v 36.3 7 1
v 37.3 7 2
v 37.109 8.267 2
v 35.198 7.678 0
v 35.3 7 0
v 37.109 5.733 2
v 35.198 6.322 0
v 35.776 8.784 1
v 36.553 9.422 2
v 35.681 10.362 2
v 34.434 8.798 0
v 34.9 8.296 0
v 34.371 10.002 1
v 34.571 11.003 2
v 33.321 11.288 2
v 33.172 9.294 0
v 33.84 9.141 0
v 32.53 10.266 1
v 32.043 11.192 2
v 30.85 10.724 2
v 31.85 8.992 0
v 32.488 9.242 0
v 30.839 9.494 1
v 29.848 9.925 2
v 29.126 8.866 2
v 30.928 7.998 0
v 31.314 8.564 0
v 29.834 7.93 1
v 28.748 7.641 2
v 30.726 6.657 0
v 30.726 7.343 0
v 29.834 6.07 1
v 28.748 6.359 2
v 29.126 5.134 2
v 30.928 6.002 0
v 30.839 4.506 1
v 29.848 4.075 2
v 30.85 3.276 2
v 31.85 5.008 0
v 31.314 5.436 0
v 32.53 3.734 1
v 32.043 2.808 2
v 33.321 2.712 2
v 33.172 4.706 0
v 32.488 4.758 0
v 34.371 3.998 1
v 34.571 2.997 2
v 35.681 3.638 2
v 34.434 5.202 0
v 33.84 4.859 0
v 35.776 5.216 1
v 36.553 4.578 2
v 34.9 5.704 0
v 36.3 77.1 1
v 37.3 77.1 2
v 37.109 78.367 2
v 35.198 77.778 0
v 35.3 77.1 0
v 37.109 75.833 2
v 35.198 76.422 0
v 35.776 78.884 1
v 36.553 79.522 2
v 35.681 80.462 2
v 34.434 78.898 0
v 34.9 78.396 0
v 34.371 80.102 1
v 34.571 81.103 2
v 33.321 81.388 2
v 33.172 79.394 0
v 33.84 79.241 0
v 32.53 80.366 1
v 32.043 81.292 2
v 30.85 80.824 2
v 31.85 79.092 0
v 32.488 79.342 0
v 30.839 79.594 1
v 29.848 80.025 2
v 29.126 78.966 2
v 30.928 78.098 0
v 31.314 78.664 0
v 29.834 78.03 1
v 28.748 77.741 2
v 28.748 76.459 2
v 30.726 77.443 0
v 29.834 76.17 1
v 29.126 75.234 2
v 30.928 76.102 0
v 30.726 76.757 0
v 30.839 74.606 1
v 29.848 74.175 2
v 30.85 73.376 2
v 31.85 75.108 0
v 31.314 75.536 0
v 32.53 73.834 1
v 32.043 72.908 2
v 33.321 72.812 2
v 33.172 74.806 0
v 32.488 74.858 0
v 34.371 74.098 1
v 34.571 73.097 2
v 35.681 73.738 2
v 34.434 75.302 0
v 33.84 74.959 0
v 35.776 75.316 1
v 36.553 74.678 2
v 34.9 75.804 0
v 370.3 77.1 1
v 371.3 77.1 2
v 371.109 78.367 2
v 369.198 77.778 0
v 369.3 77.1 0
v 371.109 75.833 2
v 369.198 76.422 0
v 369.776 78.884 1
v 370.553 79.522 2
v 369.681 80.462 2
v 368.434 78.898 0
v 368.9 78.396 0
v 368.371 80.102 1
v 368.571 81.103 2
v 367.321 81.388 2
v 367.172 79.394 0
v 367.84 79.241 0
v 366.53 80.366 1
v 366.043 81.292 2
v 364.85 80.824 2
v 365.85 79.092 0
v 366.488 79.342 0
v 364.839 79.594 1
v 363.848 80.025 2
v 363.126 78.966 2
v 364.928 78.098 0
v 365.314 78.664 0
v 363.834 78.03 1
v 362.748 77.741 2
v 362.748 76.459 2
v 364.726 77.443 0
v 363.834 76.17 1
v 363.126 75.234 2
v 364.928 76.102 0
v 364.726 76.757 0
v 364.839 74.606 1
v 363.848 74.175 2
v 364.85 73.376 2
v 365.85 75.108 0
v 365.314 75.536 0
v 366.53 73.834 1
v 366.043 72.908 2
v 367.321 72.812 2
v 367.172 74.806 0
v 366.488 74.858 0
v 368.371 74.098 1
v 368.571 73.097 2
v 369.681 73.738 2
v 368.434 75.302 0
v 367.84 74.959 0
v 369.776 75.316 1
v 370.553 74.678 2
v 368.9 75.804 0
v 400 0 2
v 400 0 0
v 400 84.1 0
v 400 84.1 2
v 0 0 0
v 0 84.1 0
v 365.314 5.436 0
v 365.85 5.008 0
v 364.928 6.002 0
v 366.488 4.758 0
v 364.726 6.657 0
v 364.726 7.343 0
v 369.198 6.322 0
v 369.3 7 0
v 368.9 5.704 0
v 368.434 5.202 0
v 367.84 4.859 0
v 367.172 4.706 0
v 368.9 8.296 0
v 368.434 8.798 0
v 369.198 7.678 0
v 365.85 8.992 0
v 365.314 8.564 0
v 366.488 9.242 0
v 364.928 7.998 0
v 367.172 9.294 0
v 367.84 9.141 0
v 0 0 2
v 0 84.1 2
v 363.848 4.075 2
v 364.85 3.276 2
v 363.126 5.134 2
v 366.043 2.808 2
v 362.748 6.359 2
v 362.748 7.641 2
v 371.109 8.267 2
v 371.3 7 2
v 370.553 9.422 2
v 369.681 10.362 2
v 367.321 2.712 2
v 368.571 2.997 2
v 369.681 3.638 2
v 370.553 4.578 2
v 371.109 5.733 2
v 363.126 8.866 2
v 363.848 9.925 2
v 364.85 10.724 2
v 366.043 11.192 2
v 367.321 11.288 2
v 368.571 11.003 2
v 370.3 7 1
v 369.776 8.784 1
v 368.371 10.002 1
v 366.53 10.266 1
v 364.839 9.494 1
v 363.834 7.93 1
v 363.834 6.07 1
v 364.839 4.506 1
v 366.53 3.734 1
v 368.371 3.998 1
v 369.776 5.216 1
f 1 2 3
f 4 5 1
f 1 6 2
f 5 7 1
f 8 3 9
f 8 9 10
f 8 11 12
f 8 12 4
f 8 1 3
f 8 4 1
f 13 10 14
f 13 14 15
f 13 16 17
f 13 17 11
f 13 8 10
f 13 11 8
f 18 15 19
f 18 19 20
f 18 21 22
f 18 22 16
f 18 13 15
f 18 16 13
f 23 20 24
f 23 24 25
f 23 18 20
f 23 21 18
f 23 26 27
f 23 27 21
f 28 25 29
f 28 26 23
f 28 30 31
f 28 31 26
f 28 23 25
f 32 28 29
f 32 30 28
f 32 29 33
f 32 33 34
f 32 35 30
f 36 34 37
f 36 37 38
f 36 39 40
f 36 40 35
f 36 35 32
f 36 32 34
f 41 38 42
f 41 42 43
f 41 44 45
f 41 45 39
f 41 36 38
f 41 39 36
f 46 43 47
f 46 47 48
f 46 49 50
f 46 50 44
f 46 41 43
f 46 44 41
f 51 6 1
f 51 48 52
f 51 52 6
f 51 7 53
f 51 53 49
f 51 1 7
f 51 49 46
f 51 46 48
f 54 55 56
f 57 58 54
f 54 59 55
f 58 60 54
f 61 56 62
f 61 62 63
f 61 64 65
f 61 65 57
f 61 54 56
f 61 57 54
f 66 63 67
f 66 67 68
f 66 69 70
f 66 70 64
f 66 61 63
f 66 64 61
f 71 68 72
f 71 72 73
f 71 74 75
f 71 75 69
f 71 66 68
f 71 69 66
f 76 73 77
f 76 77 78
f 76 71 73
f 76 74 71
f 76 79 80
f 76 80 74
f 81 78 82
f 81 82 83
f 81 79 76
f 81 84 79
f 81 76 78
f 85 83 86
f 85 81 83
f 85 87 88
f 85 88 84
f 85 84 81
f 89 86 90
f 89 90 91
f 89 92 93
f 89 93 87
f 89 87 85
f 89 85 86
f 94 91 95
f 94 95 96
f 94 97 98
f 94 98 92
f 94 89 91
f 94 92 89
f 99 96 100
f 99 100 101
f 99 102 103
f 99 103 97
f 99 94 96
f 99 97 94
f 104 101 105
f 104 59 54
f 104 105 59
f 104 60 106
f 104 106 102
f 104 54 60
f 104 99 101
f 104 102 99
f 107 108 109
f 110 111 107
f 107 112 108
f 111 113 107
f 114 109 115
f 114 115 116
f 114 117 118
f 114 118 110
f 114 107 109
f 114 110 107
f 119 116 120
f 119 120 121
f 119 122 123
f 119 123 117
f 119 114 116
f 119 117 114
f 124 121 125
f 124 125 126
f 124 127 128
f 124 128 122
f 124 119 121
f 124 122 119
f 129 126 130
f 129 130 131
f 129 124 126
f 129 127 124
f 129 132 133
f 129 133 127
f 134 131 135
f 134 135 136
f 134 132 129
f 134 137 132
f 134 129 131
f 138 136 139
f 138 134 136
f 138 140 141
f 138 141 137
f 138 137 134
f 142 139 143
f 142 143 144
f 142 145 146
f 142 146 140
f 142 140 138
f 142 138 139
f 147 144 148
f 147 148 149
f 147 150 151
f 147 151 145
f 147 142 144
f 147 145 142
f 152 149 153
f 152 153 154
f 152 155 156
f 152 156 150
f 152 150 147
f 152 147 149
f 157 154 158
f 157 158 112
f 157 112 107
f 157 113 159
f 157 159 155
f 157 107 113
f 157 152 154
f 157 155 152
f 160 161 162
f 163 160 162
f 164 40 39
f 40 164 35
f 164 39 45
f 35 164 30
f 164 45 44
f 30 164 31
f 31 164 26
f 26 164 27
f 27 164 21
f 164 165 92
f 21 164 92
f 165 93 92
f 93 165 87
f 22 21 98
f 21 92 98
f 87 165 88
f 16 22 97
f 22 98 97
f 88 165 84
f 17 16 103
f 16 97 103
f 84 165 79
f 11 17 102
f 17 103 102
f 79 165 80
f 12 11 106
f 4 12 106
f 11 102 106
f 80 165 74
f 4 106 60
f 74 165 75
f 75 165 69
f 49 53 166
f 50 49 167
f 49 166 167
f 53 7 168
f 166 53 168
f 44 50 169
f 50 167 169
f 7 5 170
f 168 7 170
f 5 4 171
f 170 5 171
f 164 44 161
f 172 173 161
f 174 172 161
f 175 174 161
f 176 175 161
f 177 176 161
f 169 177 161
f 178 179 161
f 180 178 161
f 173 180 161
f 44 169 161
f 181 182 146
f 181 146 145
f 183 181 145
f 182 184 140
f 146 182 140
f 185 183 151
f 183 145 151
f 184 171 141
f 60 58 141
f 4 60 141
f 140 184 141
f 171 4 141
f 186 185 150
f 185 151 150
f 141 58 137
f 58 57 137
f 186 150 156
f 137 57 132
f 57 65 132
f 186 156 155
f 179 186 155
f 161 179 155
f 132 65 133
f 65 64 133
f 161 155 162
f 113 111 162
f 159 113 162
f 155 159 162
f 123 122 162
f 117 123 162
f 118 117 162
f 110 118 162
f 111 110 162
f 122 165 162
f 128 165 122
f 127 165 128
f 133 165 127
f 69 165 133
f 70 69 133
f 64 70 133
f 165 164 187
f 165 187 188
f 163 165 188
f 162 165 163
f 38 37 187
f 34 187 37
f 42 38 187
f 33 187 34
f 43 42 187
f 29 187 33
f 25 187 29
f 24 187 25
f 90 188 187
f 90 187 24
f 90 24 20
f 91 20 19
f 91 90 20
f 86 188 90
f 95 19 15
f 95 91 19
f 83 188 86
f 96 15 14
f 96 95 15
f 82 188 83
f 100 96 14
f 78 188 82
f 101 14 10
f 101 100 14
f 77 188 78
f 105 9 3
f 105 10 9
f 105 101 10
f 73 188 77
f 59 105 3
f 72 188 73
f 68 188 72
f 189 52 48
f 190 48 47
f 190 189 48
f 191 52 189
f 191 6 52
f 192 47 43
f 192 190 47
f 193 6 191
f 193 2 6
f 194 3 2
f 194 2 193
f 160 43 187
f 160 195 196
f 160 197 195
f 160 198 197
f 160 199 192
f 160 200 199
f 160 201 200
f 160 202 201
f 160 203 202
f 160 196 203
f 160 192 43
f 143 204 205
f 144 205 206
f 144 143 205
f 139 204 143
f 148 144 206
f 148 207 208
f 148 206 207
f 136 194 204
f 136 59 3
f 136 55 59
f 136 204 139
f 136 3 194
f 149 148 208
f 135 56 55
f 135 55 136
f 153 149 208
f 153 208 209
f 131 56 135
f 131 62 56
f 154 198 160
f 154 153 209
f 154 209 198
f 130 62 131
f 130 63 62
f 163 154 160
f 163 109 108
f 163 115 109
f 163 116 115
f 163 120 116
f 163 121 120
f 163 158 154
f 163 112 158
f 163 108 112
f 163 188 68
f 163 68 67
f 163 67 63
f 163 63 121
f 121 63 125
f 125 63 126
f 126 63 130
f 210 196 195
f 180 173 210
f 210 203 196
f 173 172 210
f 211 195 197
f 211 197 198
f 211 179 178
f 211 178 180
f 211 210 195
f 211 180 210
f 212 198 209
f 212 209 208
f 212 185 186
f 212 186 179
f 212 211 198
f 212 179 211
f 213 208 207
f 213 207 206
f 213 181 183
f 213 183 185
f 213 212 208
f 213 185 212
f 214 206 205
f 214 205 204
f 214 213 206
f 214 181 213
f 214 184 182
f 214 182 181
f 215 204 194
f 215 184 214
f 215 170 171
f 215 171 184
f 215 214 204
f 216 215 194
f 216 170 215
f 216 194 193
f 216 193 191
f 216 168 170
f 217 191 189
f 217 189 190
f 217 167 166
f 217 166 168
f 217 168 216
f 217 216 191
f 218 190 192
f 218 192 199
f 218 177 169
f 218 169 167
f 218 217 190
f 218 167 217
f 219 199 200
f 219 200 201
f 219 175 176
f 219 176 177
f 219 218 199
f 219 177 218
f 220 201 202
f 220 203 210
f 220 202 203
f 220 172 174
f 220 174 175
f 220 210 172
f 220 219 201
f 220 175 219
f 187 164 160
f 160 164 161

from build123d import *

# Parameters (mm, degrees)
SKETCH_1_W          = 400
SKETCH_1_H          = 84.1
EXTRUDE_1_DEPTH     = 2
SKETCH_2_R          = 2.25
CUT_EXTRUDE_1_DEPTH = 409.750302752
CHAMFER_1_SIZE      = 2.05


with BuildPart() as part:
    # Эскиз1 → Бобышка-Вытянуть1 (new body)
    with BuildSketch(Plane.XY):
        with Locations((200, 42.05)):
            Rectangle(SKETCH_1_W, SKETCH_1_H)
    extrude(amount=EXTRUDE_1_DEPTH)

    # Эскиз2 → Вырез-Вытянуть1 (cut, through all)
    with BuildSketch(Plane.XY.offset(2)):
        with Locations((33, 77.1)):
            Circle(SKETCH_2_R)
        with Locations((367, 77.1)):
            Circle(SKETCH_2_R)
        with Locations((367, 7)):
            Circle(SKETCH_2_R)
        with Locations((33, 7)):
            Circle(SKETCH_2_R)
    extrude(amount=-CUT_EXTRUDE_1_DEPTH, mode=Mode.SUBTRACT)

    # Фаска1
    # the kernel refuses this chamfer: 2.05 mm, written as the material it takes off along each edge
    with BuildSketch(Plane(origin=(367, 7, 2), x_dir=(1, 0, 0), z_dir=(0, -1, 0))) as chamfer_1_piece_1:
        Polygon((2.25 + CHAMFER_1_SIZE, 0), (2.25, -CHAMFER_1_SIZE), (2.25, 0), align=None)
    revolve(axis=Axis((367, 7, 2), (0, 0, 1)), mode=Mode.SUBTRACT)
    with BuildSketch(Plane(origin=(367, 77.1, 2), x_dir=(1, 0, 0), z_dir=(0, -1, 0))) as chamfer_1_piece_2:
        Polygon((2.25 + CHAMFER_1_SIZE, 0), (2.25, -CHAMFER_1_SIZE), (2.25, 0), align=None)
    revolve(axis=Axis((367, 77.1, 2), (0, 0, 1)), mode=Mode.SUBTRACT)
    with BuildSketch(Plane(origin=(33, 7, 2), x_dir=(1, 0, 0), z_dir=(0, -1, 0))) as chamfer_1_piece_3:
        Polygon((2.25 + CHAMFER_1_SIZE, 0), (2.25, -CHAMFER_1_SIZE), (2.25, 0), align=None)
    revolve(axis=Axis((33, 7, 2), (0, 0, 1)), mode=Mode.SUBTRACT)
    with BuildSketch(Plane(origin=(33, 77.1, 2), x_dir=(1, 0, 0), z_dir=(0, -1, 0))) as chamfer_1_piece_4:
        Polygon((2.25 + CHAMFER_1_SIZE, 0), (2.25, -CHAMFER_1_SIZE), (2.25, 0), align=None)
    revolve(axis=Axis((33, 77.1, 2), (0, 0, 1)), mode=Mode.SUBTRACT)


solid = part.part
